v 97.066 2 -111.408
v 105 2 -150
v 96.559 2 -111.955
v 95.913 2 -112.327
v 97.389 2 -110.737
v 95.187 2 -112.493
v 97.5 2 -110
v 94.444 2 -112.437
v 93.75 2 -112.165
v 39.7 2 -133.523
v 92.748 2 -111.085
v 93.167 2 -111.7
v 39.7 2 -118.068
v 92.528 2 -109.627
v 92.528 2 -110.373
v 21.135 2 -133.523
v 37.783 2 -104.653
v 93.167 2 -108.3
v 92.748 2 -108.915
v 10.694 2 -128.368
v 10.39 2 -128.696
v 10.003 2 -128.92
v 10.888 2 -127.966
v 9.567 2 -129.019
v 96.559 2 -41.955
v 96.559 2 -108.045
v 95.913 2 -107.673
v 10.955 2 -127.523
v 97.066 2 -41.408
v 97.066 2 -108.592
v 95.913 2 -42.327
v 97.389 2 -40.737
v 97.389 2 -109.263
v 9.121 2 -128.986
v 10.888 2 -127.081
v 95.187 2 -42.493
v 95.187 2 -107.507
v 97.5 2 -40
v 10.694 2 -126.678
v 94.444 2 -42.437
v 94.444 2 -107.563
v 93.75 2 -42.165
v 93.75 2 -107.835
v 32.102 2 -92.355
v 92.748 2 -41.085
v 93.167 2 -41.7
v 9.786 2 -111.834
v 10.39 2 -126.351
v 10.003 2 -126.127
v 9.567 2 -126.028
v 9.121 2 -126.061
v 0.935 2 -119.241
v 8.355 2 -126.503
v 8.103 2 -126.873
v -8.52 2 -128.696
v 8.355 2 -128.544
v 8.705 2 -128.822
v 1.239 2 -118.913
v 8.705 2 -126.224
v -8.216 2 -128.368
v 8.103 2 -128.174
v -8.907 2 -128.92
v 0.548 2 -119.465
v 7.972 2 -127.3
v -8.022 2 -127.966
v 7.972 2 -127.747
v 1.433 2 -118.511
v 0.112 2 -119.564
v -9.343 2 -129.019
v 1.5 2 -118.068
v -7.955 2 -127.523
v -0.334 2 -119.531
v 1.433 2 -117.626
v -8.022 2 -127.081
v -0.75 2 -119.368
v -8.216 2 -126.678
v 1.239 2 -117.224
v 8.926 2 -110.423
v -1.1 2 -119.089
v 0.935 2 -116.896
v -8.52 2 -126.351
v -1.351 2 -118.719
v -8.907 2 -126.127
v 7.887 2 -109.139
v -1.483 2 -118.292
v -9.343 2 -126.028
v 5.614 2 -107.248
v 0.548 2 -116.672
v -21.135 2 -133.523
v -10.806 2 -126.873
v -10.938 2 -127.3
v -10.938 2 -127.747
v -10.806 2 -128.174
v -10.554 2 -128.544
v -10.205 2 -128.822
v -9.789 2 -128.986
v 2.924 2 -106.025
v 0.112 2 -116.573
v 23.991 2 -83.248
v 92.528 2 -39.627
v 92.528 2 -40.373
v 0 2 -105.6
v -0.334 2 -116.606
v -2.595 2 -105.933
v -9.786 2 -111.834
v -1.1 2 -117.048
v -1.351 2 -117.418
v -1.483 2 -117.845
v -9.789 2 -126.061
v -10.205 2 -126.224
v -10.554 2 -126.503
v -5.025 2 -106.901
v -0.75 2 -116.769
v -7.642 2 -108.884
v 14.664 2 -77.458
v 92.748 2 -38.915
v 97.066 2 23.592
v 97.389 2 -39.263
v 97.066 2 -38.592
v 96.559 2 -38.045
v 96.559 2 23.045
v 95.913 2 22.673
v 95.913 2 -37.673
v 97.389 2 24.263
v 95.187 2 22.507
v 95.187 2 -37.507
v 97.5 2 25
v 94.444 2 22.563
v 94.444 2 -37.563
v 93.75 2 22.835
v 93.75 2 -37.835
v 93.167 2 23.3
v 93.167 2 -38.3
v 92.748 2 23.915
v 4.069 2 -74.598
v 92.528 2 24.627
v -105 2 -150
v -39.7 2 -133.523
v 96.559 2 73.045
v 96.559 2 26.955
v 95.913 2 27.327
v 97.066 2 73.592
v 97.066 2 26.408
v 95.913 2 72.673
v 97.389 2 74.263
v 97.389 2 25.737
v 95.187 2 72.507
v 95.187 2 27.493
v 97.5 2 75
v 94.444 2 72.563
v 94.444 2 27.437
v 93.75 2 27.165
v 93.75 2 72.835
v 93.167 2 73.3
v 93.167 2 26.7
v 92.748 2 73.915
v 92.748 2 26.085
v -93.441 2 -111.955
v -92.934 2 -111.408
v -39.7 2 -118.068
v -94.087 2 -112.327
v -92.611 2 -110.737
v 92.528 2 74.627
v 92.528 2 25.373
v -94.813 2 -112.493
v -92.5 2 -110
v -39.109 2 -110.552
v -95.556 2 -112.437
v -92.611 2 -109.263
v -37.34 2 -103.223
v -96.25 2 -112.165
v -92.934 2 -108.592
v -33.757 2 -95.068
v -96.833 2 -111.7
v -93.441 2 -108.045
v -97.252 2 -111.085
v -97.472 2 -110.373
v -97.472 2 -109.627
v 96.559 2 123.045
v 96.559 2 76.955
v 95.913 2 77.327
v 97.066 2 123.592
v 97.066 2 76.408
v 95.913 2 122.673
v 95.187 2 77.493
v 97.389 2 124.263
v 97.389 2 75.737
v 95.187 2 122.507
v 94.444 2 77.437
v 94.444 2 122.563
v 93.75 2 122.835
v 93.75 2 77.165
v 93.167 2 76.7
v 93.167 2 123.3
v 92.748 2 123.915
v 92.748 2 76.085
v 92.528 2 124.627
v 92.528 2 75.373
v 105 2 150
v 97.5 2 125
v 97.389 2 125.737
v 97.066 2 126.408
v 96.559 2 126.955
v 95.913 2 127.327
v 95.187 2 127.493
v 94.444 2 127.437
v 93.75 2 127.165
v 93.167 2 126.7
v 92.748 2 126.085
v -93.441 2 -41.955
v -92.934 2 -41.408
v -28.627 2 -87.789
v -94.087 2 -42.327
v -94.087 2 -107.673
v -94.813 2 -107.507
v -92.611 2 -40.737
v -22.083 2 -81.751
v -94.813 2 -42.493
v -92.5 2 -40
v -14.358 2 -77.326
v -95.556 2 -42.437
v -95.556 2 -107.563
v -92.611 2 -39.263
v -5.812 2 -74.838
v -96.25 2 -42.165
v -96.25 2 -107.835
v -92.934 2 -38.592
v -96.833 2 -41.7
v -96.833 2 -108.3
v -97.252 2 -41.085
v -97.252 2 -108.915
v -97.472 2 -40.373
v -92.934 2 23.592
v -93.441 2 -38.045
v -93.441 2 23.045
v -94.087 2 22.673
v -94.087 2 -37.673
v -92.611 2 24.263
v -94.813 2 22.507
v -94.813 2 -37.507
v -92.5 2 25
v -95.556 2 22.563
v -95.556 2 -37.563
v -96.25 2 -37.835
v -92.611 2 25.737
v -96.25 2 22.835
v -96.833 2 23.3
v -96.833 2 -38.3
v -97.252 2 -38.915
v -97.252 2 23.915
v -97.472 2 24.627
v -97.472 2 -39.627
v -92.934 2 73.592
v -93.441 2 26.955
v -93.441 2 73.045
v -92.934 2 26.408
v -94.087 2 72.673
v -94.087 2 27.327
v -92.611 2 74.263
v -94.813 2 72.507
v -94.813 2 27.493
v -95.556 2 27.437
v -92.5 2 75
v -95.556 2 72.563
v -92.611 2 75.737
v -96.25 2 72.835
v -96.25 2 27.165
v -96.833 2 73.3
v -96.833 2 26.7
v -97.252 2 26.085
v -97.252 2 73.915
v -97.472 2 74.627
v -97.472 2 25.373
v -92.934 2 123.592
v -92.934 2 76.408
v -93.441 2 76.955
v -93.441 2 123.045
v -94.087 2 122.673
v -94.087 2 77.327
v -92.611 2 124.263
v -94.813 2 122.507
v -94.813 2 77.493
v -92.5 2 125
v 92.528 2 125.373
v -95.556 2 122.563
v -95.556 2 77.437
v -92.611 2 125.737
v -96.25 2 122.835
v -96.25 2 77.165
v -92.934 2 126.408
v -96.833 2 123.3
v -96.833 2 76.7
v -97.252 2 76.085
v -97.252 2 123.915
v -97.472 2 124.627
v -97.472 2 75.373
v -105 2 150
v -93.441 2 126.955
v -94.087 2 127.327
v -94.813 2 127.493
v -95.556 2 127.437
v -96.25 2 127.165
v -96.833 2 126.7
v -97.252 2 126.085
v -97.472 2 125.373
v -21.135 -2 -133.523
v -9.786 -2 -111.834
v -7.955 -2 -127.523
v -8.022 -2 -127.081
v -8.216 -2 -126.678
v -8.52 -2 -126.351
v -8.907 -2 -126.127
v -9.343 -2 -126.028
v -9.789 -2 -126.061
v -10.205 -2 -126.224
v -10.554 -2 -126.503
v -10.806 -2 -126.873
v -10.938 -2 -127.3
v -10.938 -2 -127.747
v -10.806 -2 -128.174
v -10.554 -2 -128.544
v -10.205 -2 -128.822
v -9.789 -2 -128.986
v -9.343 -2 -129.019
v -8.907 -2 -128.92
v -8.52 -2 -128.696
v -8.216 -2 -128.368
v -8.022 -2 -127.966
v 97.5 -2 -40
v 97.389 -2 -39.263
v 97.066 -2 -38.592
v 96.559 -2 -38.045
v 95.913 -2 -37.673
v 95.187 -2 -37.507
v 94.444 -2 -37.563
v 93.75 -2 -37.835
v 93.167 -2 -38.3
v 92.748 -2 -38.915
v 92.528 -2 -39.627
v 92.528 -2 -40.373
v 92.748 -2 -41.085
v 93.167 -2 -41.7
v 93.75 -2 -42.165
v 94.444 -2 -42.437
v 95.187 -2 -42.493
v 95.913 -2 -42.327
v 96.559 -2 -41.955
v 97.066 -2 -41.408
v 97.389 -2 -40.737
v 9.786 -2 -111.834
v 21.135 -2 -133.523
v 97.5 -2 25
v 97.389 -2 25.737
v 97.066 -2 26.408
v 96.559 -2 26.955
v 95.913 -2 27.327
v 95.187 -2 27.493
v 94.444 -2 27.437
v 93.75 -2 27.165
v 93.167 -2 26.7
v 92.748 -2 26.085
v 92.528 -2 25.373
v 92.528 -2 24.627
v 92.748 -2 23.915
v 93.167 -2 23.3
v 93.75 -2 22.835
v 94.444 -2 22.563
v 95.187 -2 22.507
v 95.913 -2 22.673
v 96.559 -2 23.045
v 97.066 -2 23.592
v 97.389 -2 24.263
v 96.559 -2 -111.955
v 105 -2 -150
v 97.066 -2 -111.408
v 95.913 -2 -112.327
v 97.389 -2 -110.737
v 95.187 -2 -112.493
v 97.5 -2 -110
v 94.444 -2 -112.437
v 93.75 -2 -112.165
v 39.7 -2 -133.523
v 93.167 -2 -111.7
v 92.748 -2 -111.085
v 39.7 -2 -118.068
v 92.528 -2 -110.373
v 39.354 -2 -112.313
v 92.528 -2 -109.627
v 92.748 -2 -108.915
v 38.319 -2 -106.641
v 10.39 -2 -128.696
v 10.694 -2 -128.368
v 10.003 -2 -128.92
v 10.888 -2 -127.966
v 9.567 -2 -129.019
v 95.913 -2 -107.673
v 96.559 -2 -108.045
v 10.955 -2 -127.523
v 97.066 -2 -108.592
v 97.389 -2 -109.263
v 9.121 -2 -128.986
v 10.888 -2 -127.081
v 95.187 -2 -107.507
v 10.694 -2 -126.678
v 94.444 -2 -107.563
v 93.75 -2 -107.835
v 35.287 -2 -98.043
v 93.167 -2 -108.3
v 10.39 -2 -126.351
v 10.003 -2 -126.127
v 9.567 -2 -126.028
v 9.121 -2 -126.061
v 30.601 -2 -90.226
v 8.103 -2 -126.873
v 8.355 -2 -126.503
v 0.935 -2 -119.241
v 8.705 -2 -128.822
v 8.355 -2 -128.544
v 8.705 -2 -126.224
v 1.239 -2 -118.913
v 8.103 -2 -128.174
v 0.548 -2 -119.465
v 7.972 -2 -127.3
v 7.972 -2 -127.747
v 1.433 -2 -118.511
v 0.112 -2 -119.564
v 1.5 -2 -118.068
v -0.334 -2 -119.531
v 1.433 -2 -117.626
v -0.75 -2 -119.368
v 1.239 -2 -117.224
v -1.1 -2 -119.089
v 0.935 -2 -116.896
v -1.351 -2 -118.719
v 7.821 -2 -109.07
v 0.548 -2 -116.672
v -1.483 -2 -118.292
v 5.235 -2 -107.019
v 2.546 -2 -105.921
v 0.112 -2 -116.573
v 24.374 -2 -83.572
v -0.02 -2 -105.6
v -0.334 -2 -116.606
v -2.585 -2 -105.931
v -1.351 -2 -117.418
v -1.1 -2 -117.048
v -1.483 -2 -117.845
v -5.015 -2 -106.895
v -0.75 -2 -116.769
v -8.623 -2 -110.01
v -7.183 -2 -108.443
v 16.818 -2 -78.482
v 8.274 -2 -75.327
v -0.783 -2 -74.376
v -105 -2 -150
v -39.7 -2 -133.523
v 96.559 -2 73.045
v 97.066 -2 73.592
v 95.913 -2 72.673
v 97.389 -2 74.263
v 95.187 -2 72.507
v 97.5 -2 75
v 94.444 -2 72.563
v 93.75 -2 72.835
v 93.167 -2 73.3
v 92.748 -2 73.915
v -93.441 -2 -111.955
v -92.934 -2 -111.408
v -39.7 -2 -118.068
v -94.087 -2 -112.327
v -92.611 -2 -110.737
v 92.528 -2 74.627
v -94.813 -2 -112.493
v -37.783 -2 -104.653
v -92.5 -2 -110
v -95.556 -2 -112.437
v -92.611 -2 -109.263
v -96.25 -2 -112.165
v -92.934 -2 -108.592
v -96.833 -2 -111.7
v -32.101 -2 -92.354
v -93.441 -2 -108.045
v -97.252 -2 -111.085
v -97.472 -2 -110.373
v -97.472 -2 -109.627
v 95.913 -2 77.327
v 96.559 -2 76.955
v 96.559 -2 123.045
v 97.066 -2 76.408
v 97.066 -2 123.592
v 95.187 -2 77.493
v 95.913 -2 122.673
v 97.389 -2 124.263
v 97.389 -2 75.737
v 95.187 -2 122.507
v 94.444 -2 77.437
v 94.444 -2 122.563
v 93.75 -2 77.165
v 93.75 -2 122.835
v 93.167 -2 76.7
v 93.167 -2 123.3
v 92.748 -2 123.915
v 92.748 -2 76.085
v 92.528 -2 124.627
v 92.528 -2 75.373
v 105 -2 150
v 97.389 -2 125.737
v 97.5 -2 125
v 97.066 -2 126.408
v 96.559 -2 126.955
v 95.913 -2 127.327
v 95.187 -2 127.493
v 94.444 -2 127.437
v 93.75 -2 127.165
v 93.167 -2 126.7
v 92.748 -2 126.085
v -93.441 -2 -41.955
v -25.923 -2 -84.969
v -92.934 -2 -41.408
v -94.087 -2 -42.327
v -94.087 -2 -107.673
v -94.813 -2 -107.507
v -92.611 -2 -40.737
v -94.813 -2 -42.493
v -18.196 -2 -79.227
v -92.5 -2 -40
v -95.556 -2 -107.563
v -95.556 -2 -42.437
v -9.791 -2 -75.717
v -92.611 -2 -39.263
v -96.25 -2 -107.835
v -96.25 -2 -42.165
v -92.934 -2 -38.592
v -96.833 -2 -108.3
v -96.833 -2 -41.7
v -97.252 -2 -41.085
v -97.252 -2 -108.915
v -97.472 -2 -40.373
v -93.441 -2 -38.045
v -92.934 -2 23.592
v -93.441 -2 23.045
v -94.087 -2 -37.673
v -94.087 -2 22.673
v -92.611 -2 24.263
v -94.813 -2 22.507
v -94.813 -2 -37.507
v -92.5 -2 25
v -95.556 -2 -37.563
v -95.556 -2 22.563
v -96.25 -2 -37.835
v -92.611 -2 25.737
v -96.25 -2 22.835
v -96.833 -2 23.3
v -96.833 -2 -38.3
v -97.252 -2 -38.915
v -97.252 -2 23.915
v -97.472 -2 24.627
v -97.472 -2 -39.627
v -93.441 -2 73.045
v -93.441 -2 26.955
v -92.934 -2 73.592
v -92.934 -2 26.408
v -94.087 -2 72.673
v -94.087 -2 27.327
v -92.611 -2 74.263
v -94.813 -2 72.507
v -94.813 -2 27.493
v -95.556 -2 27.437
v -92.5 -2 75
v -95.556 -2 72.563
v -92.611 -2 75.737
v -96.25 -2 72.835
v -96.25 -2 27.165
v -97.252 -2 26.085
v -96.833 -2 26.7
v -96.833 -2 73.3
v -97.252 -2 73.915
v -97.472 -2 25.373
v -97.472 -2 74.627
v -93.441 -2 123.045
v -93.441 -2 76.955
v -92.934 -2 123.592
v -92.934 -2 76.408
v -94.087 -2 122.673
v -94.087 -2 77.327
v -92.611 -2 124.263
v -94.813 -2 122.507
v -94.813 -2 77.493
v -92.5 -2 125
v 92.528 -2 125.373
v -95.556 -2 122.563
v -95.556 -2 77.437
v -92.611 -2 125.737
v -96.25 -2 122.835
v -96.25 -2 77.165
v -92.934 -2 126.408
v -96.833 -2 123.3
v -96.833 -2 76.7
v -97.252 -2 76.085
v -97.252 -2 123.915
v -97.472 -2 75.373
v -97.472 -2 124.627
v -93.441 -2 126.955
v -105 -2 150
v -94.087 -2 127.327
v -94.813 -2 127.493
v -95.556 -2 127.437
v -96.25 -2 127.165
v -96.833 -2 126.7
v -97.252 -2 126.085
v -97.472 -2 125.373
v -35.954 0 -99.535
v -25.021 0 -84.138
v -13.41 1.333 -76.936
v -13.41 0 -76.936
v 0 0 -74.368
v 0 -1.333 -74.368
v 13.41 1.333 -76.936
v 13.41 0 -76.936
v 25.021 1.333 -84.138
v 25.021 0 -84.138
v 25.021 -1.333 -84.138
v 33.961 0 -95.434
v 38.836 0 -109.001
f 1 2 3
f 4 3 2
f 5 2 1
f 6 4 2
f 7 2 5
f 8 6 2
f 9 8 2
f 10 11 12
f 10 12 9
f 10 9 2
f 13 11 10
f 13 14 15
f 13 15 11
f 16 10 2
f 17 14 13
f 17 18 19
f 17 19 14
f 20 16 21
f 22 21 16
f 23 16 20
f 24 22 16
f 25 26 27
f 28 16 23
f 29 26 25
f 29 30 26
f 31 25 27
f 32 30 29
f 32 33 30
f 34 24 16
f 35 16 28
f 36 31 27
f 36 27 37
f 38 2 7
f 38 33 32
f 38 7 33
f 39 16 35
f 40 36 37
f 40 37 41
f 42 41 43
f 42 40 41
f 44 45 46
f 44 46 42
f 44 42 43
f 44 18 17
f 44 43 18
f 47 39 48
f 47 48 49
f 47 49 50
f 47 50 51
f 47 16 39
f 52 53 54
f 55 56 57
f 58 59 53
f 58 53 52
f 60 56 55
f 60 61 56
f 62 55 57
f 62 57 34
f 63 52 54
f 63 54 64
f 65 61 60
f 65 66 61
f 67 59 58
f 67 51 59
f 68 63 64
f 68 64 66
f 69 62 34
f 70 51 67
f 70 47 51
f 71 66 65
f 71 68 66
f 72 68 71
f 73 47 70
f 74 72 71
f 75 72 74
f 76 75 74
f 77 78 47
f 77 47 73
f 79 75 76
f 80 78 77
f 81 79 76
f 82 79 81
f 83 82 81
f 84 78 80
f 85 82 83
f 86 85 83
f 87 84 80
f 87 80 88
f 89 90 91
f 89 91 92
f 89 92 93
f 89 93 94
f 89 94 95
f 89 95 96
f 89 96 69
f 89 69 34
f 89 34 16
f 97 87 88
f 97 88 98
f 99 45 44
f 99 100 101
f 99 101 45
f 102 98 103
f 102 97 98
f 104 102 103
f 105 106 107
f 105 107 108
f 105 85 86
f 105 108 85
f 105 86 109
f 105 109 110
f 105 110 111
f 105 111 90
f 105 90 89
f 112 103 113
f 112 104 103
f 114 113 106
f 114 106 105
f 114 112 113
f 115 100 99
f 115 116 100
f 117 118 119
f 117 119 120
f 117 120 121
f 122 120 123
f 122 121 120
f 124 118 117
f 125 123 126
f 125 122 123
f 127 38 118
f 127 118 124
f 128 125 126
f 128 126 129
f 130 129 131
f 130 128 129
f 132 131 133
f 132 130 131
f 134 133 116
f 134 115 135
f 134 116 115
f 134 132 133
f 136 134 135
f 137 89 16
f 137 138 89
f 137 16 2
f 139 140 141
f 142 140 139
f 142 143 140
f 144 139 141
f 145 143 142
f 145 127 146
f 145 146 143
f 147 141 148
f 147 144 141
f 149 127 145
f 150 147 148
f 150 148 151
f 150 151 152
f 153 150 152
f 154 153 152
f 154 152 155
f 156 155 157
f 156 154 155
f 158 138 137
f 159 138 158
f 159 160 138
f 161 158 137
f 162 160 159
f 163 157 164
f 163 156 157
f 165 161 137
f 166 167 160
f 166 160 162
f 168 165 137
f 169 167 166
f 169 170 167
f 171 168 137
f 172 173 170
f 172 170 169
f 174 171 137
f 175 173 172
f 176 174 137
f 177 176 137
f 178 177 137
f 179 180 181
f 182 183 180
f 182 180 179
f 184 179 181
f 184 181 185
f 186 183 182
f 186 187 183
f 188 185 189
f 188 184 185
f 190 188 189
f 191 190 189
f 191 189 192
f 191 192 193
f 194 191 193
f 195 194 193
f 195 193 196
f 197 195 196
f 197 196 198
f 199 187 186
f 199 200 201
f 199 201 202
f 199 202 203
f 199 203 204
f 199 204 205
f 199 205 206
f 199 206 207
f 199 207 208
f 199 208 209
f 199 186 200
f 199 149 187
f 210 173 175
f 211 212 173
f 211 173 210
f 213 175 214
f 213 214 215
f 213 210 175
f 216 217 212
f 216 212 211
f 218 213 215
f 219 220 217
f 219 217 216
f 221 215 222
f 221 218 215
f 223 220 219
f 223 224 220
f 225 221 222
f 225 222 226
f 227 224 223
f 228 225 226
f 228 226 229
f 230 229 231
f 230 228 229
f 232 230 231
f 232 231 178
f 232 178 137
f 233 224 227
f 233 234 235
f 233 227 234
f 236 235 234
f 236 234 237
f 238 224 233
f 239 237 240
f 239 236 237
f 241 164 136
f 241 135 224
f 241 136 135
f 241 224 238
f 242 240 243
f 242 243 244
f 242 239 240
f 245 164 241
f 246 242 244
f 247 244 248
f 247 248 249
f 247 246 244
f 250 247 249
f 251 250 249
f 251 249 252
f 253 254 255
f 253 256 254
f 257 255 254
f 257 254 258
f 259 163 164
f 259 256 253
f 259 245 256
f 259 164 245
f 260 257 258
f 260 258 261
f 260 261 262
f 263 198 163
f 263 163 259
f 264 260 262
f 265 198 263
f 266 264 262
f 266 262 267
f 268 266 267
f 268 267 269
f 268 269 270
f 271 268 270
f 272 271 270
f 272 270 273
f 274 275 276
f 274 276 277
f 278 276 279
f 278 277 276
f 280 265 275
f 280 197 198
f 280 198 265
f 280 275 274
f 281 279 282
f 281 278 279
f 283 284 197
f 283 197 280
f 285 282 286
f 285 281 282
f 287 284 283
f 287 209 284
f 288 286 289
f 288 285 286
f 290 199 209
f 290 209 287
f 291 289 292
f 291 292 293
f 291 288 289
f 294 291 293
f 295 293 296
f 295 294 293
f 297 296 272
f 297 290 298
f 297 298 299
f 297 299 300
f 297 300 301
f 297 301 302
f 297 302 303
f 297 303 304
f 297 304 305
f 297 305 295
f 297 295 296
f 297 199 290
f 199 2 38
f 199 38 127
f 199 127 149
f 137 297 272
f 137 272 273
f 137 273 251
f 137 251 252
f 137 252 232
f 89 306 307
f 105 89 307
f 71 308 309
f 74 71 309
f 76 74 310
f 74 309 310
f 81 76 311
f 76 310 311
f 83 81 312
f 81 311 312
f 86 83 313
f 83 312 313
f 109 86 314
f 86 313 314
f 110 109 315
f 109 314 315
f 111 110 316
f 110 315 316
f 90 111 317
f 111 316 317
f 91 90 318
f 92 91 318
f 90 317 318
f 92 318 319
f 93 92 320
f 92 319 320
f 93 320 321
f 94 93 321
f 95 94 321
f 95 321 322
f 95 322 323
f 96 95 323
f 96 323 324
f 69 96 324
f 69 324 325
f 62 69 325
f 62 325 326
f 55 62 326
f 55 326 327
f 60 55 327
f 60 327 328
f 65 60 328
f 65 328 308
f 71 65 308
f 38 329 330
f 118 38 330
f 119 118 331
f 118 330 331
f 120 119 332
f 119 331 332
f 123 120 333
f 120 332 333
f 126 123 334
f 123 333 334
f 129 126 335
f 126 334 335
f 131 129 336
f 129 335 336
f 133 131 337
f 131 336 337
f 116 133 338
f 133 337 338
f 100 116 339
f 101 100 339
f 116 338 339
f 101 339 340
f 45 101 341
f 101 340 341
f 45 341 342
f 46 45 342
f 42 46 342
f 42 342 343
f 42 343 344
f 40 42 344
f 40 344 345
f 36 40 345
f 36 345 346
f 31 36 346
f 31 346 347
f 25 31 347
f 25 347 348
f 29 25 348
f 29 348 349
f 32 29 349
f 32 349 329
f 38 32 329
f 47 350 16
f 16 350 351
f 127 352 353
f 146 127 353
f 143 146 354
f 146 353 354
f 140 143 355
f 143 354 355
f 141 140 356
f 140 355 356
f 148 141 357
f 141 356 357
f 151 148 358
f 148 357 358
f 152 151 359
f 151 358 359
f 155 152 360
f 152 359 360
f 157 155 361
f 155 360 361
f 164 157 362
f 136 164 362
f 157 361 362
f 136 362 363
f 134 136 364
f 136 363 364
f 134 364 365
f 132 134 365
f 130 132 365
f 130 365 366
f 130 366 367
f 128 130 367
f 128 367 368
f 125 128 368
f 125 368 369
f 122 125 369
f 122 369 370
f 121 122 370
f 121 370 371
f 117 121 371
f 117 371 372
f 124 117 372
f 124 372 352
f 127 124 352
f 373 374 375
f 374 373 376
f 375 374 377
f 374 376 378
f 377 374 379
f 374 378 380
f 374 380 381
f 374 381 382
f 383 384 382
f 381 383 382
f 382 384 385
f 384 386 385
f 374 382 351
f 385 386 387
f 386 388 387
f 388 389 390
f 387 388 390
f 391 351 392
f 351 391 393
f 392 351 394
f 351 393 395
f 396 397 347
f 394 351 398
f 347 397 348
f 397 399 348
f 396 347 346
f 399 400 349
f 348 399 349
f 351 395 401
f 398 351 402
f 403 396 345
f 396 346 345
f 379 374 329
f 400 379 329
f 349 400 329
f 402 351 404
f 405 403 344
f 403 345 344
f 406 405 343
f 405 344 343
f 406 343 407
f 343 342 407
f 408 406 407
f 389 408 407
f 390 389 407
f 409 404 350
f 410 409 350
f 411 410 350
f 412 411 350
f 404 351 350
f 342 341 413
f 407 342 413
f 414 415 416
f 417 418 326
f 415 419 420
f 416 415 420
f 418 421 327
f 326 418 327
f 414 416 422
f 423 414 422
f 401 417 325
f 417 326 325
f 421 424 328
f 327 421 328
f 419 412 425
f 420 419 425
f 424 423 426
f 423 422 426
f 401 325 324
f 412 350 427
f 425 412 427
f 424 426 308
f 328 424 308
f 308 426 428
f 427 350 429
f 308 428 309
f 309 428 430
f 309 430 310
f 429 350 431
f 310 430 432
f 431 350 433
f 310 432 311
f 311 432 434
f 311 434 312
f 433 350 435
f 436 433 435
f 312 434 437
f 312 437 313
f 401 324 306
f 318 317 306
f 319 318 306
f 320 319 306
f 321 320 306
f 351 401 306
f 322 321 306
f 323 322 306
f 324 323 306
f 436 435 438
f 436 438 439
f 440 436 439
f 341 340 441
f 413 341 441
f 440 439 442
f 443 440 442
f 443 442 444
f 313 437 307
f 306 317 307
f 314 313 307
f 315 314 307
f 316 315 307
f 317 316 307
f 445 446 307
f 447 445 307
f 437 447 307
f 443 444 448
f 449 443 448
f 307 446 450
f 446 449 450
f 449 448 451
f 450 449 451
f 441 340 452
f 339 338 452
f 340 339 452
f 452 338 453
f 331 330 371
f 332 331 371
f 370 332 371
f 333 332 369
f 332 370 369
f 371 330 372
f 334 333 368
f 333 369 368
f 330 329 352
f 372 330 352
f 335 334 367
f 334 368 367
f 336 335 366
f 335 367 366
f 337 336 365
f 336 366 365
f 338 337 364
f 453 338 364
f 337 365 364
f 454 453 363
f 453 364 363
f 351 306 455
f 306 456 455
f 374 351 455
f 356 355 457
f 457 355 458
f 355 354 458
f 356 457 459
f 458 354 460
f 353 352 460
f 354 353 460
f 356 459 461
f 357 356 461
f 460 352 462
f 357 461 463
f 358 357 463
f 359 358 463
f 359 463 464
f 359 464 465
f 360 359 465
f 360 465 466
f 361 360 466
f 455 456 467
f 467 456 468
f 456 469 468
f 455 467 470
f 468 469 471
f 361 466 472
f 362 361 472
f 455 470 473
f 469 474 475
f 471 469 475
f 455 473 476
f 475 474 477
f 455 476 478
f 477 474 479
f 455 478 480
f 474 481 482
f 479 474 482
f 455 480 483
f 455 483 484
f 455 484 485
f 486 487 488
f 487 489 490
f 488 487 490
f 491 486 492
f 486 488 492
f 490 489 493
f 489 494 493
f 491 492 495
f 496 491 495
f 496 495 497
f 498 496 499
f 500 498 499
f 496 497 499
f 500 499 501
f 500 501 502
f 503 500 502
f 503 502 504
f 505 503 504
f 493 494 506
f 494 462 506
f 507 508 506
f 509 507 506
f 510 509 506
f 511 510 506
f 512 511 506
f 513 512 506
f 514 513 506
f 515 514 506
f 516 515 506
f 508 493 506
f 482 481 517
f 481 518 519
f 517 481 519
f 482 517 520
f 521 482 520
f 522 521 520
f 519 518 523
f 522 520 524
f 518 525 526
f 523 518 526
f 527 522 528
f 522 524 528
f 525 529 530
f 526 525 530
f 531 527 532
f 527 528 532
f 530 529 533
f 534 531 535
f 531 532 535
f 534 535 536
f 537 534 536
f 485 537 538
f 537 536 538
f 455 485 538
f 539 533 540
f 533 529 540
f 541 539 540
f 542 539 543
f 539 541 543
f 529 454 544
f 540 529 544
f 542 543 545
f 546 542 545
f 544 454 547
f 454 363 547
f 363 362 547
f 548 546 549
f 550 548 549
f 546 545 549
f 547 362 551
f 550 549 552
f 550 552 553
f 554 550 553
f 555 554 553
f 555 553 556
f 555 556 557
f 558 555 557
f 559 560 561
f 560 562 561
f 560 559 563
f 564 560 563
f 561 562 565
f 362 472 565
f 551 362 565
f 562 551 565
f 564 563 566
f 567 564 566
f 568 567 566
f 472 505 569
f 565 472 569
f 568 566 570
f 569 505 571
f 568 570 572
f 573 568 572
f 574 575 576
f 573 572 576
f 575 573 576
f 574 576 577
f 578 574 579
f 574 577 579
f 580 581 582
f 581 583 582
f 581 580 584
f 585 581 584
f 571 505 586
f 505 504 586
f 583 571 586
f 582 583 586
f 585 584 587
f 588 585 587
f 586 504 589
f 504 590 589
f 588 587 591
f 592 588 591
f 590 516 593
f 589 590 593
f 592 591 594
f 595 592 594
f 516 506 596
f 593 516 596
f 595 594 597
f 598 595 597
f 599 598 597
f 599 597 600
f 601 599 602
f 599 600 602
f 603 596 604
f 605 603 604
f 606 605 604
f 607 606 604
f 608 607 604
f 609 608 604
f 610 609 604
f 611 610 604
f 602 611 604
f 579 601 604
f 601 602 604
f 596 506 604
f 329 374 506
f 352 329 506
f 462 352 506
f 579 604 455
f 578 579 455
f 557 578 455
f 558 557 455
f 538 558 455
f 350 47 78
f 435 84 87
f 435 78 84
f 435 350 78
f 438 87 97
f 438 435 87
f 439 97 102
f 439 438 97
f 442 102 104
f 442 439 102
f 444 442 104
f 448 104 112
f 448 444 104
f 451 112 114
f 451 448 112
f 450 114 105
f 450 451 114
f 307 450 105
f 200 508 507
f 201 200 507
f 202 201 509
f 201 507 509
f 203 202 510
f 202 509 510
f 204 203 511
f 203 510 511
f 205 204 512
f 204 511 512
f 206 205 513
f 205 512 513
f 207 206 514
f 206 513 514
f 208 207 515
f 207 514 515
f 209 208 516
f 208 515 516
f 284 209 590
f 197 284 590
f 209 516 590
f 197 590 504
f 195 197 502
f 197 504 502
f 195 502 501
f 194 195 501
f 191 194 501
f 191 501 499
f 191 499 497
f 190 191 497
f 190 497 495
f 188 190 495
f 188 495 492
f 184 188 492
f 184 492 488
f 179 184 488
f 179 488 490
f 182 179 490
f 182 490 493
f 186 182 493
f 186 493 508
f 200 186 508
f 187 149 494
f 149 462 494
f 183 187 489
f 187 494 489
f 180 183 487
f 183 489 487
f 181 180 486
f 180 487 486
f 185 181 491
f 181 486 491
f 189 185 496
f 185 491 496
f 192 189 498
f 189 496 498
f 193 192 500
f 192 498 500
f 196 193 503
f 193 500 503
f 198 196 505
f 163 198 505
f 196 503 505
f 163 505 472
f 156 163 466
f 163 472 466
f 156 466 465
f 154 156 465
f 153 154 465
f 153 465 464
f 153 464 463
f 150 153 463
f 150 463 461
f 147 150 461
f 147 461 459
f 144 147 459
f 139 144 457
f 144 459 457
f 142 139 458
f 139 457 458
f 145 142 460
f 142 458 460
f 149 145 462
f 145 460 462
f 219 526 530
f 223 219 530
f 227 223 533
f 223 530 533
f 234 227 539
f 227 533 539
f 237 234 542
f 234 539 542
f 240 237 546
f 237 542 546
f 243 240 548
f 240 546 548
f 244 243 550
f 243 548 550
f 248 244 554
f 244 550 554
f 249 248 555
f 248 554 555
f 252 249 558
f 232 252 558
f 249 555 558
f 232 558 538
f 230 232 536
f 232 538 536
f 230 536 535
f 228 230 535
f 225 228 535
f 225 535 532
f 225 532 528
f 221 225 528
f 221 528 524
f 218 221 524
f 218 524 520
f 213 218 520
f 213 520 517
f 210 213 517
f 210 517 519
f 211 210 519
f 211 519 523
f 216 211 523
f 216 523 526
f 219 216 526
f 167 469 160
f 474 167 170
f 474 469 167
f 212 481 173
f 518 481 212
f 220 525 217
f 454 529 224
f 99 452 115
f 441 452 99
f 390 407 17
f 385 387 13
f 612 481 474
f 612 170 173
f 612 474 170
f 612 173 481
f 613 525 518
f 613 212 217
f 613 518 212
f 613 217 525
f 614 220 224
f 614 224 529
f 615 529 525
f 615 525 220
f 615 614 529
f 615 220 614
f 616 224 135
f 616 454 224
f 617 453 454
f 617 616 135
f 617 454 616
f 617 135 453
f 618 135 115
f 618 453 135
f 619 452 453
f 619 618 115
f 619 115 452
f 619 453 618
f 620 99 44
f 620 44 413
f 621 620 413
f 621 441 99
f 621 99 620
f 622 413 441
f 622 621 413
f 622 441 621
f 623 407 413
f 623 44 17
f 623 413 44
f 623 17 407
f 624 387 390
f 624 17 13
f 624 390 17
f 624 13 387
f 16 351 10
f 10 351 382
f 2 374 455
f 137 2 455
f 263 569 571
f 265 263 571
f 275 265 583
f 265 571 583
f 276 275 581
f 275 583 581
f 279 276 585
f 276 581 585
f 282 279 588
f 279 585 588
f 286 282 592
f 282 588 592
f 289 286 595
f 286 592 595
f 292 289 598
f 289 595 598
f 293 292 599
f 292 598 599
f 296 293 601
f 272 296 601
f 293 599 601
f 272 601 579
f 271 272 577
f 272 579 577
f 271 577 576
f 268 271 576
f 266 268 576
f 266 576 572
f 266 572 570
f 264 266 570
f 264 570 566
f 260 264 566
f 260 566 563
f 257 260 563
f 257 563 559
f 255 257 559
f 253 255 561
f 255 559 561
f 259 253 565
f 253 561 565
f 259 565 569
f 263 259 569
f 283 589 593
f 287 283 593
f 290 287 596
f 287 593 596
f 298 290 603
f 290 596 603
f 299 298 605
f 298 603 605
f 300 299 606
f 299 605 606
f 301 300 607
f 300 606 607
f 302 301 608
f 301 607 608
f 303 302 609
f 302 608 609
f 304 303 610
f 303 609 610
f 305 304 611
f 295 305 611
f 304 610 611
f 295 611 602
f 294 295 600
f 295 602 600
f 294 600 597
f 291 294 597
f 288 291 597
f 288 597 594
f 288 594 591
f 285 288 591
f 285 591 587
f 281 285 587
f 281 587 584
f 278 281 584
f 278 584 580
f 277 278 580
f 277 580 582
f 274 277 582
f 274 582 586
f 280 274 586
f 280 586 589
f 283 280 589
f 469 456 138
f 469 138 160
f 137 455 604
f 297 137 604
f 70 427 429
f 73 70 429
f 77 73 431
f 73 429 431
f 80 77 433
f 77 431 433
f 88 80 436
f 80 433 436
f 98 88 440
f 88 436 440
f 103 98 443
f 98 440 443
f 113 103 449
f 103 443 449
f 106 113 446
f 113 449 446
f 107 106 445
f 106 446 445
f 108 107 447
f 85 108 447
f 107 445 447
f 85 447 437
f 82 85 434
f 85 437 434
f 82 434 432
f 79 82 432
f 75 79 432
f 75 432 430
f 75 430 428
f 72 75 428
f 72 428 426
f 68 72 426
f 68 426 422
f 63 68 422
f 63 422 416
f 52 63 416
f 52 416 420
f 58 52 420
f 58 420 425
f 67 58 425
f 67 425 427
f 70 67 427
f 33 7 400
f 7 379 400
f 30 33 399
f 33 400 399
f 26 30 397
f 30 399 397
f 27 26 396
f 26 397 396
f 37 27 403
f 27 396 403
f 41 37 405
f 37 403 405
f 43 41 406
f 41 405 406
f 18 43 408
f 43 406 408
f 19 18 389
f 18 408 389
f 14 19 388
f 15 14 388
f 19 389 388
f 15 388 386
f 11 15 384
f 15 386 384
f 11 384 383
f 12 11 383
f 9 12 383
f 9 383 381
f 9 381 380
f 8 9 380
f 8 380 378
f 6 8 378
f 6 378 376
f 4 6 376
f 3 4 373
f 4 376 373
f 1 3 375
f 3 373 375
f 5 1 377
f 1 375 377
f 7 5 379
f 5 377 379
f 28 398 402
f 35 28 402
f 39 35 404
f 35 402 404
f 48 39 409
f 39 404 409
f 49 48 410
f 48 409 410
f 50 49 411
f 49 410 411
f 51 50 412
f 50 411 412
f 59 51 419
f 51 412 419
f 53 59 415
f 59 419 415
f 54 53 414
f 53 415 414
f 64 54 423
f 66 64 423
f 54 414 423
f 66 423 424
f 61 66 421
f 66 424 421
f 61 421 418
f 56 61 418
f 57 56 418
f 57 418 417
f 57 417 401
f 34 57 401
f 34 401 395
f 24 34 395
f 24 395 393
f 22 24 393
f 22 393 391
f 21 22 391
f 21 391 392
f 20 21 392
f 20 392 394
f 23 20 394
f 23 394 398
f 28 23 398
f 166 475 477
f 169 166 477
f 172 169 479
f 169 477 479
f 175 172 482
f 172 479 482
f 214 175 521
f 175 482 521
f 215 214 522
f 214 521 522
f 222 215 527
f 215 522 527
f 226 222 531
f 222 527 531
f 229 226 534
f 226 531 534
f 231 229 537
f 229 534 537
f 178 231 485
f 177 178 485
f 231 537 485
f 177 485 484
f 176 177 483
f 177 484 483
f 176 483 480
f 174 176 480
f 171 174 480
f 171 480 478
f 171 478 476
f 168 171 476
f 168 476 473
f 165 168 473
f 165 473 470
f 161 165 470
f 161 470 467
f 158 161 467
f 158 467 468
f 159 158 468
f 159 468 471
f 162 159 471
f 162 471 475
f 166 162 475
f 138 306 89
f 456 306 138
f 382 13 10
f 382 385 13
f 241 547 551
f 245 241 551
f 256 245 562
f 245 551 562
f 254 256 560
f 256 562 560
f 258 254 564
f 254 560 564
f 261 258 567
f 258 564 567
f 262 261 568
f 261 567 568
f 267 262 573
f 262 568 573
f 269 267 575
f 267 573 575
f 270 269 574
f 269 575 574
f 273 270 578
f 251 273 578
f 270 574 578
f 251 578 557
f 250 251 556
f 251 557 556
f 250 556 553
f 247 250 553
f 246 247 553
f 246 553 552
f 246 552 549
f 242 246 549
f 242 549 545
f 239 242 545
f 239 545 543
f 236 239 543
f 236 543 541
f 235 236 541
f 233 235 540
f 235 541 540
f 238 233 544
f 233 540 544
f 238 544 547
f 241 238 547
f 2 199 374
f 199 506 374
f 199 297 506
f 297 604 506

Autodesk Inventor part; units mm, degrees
sketch "Эскиз2" plane through (0, 0, 0) normal (0, 1, 0) x (-1, 0, 0)
  line L0 (105, 150) -> (-105, 150)
  line L1 (-105, 150) -> (-105, -150)
  line L2 (-105, -150) -> (105, -150)
  line L3 (105, -150) -> (105, 150)
  line L4 (105, 150) -> (-105, -150) construction
  line L5 (-105, 150) -> (105, -150) construction
  point P0 (0, 0)
  dimension "d0" = 300
  dimension "d1" = 210
extrude "Выдавливание1" add sketch "Эскиз2" along normal mid plane 4
sketch "Эскиз4" plane through (0, 2, 0) normal (0, 1, 0) x (1, 0, 0)
  point P0 (0, 0)
sketch "Эскиз5" plane through (0, -2, 0) normal (0, -1, 0) x (1, 0, 0)
  line L0 (46.7, -140) -> (-46.7, -140) projected
  line L1 (-46.7, -140) -> (-46.7, -121.5234) projected
  arc A0 (-46.594, -118.6405) -> (-46.7, -121.5234) centre (-7.4334, -121.5237) ccw projected
  ellipse E0 centre (-51.6674, -118.2652) end of major axis (-52.1006, -124.2245) minor radius 5.0873 (-46.594, -118.6405) -> (-46.5935, -117.6187) ccw projected
  ellipse E1 centre (-32.0119, -116.0476) end of major axis (-31.7353, -98.7858) minor radius 14.6347 (-46.6171, -115.0294) -> (-46.5935, -117.6187) ccw projected
  spline S0 degree 3 poles (-46.6171, -115.0294) (-46.5015, -112.9122) (-46.0285, -108.6931) (-44.8405, -103.5371) (-43.2174, -98.5282) (-41.5773, -94.6618) (-39.1217, -90.0608) (-36.8431, -86.5874) (-33.6324, -82.5567) (-30.7879, -79.6008) (-26.9267, -76.2879) (-23.6107, -73.9602) (-19.2299, -71.4921) (-15.5575, -69.8842) (-10.8129, -68.3603) (-6.9178, -67.5387) (-1.9855, -67.0233) (1.9855, -67.0233) (6.9178, -67.5387) (10.8129, -68.3603) (15.5575, -69.8842) (19.2299, -71.4921) (23.6107, -73.9602) (26.9267, -76.2879) (30.7879, -79.6008) (33.6324, -82.5567) (36.8431, -86.5874) (39.1217, -90.0608) (41.5773, -94.6618) (43.2174, -98.5282) (44.8405, -103.5371) (46.0285, -108.6931) (46.5015, -112.9122) (46.6171, -115.0294) knots 1.630961 1.630961 1.630961 1.630961 1.756847 1.882733 1.945676 2.071562 2.134505 2.260391 2.323334 2.44922 2.512163 2.638049 2.700992 2.826878 2.889821 3.015707 3.07865 3.204536 3.267479 3.393365 3.456308 3.582194 3.645137 3.771023 3.833966 3.959852 4.022795 4.148681 4.211624 4.33751 4.400453 4.526339 4.652225 4.652225 4.652225 4.652225 projected
  ellipse E2 centre (32.0119, -116.0476) end of major axis (31.7353, -98.7858) minor radius 14.6347 (46.5935, -117.6187) -> (46.6171, -115.0294) ccw projected
  ellipse E3 centre (51.6674, -118.2652) end of major axis (52.1006, -124.2245) minor radius 5.0873 (46.5935, -117.6187) -> (46.594, -118.6405) ccw projected
  arc A1 (46.7, -121.5234) -> (46.594, -118.6405) centre (7.4334, -121.5237) ccw projected
  line L2 (46.7, -121.5234) -> (46.7, -140) projected
  line L3 (38.7, -118.0685) -> (38.7, -133.5234) projected
  ellipse E4 centre (0, -118.0685) end of major axis (0, -75.3678) minor radius 38.7 (38.7, -118.0685) -> (-38.7, -118.0685) ccw projected
  line L4 (-38.7, -133.5234) -> (-38.7, -118.0685) projected
  line L5 (-21.135, -133.5234) -> (-38.7, -133.5234) projected
  circle A2 centre (9.4549, -127.5234) radius 2.1 projected
  circle A3 centre (0, -118.0685) radius 2.1 projected
  circle A4 centre (-9.4549, -127.5234) radius 2.1 projected
  circle A5 centre (9.4549, -127.5234) radius 1.5
  circle A6 centre (-9.4549, -127.5234) radius 1.5
  circle A7 centre (0, -118.0685) radius 1.5
  line L6 (39.7, -118.0685) -> (39.7, -134.4459)
  line L7 (-39.7, -133.5234) -> (-39.7, -118.0685)
  line L8 (38.7, -133.5234) -> (39.7, -133.5234)
  line L9 (-38.7, -133.5234) -> (-39.7, -133.5234)
  line L10 (38.7, -133.5234) -> (21.135, -133.5234) projected
  line L11 (9.7861, -111.8345) -> (21.135, -133.5234) projected
  ellipse E5 centre (0, -118.0685) end of major axis (0, -105.6004) minor radius 11.3 (9.7861, -111.8345) -> (-9.7861, -111.8345) ccw projected
  line L12 (-21.135, -133.5234) -> (-9.7861, -111.8345) projected
  spline S1 degree 5 poles (-39.7, -118.0685) (-39.7, -116.2442) (-39.6135, -114.4198) (-39.4406, -112.6008) (-38.359, -105.0548) (-35.7799, -97.7978) (-32.9708, -92.6223) (-25.8915, -83.6065) (-16.2115, -77.5088) (-10.9886, -75.4127) (0, -73.3231) (10.9886, -75.4127) (16.2115, -77.5088) (25.8915, -83.6065) (32.9708, -92.6223) (35.7799, -97.7978) (38.359, -105.0548) (39.4406, -112.6008) (39.6135, -114.4198) (39.7, -116.2442) (39.7, -118.0685) knots 0 0 0 0 0 0 0.069589 0.069589 0.069589 0.290442 0.290442 0.290442 0.5 0.5 0.5 0.709558 0.709558 0.709558 0.930411 0.930411 0.930411 1 1 1 1 1 1
  point P0 (0, 0)
  dimension "d18" = 1
  dimension "d15" = 3
  dimension "d16" = 3
  dimension "d17" = 3
extrude "Выдавливание3" cut sketch "Эскиз5" against normal blind 10 contours E4 L4 L9 L7 S1 L6 L8 L3 | L3 L10 L11 E5 L12 L5 L4 E4 | A5 | A6 | A7
sketch "Эскиз6" plane through (0, -2, 0) normal (0, -1, 0) x (1, 0, 0)
  circle A0 centre (95, -110) radius 2.5
  circle A1 centre (95, -40) radius 2.5
  circle A2 centre (95, 25) radius 2.5
  circle A3 centre (95, 75) radius 2.5
  circle A4 centre (95, 125) radius 2.5
  circle A5 centre (-95, -110) radius 2.5
  circle A6 centre (-95, -40) radius 2.5
  circle A7 centre (-95, 25) radius 2.5
  circle A8 centre (-95, 75) radius 2.5
  circle A9 centre (-95, 125) radius 2.5
  point P0 (0, 0)
extrude "Выдавливание4" cut sketch "Эскиз6" against normal up to next
properties part number "Передняя_фанера"
